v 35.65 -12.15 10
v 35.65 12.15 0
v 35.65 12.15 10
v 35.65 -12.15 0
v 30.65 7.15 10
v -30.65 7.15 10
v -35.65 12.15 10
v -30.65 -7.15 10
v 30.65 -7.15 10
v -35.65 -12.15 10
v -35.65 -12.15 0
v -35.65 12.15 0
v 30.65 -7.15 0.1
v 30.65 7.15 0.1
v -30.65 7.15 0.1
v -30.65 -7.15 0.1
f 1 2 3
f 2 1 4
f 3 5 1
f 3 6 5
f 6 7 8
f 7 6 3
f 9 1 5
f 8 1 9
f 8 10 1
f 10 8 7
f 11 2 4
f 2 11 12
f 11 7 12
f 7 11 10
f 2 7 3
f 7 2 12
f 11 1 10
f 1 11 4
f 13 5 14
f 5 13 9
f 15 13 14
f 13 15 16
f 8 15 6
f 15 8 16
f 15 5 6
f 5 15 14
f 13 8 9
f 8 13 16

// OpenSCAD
module lcd_display() {
    difference() {
        // Main body of the display
        translate([-71.3/2, -24.3/2, 0])
            cube([71.3, 24.3, 10]);

        // Cutout for the screen area
        translate([-61.3/2, -14.3/2, 0.1])
            cube([61.3, 14.3, 10.1]);
    }
}

lcd_display();
